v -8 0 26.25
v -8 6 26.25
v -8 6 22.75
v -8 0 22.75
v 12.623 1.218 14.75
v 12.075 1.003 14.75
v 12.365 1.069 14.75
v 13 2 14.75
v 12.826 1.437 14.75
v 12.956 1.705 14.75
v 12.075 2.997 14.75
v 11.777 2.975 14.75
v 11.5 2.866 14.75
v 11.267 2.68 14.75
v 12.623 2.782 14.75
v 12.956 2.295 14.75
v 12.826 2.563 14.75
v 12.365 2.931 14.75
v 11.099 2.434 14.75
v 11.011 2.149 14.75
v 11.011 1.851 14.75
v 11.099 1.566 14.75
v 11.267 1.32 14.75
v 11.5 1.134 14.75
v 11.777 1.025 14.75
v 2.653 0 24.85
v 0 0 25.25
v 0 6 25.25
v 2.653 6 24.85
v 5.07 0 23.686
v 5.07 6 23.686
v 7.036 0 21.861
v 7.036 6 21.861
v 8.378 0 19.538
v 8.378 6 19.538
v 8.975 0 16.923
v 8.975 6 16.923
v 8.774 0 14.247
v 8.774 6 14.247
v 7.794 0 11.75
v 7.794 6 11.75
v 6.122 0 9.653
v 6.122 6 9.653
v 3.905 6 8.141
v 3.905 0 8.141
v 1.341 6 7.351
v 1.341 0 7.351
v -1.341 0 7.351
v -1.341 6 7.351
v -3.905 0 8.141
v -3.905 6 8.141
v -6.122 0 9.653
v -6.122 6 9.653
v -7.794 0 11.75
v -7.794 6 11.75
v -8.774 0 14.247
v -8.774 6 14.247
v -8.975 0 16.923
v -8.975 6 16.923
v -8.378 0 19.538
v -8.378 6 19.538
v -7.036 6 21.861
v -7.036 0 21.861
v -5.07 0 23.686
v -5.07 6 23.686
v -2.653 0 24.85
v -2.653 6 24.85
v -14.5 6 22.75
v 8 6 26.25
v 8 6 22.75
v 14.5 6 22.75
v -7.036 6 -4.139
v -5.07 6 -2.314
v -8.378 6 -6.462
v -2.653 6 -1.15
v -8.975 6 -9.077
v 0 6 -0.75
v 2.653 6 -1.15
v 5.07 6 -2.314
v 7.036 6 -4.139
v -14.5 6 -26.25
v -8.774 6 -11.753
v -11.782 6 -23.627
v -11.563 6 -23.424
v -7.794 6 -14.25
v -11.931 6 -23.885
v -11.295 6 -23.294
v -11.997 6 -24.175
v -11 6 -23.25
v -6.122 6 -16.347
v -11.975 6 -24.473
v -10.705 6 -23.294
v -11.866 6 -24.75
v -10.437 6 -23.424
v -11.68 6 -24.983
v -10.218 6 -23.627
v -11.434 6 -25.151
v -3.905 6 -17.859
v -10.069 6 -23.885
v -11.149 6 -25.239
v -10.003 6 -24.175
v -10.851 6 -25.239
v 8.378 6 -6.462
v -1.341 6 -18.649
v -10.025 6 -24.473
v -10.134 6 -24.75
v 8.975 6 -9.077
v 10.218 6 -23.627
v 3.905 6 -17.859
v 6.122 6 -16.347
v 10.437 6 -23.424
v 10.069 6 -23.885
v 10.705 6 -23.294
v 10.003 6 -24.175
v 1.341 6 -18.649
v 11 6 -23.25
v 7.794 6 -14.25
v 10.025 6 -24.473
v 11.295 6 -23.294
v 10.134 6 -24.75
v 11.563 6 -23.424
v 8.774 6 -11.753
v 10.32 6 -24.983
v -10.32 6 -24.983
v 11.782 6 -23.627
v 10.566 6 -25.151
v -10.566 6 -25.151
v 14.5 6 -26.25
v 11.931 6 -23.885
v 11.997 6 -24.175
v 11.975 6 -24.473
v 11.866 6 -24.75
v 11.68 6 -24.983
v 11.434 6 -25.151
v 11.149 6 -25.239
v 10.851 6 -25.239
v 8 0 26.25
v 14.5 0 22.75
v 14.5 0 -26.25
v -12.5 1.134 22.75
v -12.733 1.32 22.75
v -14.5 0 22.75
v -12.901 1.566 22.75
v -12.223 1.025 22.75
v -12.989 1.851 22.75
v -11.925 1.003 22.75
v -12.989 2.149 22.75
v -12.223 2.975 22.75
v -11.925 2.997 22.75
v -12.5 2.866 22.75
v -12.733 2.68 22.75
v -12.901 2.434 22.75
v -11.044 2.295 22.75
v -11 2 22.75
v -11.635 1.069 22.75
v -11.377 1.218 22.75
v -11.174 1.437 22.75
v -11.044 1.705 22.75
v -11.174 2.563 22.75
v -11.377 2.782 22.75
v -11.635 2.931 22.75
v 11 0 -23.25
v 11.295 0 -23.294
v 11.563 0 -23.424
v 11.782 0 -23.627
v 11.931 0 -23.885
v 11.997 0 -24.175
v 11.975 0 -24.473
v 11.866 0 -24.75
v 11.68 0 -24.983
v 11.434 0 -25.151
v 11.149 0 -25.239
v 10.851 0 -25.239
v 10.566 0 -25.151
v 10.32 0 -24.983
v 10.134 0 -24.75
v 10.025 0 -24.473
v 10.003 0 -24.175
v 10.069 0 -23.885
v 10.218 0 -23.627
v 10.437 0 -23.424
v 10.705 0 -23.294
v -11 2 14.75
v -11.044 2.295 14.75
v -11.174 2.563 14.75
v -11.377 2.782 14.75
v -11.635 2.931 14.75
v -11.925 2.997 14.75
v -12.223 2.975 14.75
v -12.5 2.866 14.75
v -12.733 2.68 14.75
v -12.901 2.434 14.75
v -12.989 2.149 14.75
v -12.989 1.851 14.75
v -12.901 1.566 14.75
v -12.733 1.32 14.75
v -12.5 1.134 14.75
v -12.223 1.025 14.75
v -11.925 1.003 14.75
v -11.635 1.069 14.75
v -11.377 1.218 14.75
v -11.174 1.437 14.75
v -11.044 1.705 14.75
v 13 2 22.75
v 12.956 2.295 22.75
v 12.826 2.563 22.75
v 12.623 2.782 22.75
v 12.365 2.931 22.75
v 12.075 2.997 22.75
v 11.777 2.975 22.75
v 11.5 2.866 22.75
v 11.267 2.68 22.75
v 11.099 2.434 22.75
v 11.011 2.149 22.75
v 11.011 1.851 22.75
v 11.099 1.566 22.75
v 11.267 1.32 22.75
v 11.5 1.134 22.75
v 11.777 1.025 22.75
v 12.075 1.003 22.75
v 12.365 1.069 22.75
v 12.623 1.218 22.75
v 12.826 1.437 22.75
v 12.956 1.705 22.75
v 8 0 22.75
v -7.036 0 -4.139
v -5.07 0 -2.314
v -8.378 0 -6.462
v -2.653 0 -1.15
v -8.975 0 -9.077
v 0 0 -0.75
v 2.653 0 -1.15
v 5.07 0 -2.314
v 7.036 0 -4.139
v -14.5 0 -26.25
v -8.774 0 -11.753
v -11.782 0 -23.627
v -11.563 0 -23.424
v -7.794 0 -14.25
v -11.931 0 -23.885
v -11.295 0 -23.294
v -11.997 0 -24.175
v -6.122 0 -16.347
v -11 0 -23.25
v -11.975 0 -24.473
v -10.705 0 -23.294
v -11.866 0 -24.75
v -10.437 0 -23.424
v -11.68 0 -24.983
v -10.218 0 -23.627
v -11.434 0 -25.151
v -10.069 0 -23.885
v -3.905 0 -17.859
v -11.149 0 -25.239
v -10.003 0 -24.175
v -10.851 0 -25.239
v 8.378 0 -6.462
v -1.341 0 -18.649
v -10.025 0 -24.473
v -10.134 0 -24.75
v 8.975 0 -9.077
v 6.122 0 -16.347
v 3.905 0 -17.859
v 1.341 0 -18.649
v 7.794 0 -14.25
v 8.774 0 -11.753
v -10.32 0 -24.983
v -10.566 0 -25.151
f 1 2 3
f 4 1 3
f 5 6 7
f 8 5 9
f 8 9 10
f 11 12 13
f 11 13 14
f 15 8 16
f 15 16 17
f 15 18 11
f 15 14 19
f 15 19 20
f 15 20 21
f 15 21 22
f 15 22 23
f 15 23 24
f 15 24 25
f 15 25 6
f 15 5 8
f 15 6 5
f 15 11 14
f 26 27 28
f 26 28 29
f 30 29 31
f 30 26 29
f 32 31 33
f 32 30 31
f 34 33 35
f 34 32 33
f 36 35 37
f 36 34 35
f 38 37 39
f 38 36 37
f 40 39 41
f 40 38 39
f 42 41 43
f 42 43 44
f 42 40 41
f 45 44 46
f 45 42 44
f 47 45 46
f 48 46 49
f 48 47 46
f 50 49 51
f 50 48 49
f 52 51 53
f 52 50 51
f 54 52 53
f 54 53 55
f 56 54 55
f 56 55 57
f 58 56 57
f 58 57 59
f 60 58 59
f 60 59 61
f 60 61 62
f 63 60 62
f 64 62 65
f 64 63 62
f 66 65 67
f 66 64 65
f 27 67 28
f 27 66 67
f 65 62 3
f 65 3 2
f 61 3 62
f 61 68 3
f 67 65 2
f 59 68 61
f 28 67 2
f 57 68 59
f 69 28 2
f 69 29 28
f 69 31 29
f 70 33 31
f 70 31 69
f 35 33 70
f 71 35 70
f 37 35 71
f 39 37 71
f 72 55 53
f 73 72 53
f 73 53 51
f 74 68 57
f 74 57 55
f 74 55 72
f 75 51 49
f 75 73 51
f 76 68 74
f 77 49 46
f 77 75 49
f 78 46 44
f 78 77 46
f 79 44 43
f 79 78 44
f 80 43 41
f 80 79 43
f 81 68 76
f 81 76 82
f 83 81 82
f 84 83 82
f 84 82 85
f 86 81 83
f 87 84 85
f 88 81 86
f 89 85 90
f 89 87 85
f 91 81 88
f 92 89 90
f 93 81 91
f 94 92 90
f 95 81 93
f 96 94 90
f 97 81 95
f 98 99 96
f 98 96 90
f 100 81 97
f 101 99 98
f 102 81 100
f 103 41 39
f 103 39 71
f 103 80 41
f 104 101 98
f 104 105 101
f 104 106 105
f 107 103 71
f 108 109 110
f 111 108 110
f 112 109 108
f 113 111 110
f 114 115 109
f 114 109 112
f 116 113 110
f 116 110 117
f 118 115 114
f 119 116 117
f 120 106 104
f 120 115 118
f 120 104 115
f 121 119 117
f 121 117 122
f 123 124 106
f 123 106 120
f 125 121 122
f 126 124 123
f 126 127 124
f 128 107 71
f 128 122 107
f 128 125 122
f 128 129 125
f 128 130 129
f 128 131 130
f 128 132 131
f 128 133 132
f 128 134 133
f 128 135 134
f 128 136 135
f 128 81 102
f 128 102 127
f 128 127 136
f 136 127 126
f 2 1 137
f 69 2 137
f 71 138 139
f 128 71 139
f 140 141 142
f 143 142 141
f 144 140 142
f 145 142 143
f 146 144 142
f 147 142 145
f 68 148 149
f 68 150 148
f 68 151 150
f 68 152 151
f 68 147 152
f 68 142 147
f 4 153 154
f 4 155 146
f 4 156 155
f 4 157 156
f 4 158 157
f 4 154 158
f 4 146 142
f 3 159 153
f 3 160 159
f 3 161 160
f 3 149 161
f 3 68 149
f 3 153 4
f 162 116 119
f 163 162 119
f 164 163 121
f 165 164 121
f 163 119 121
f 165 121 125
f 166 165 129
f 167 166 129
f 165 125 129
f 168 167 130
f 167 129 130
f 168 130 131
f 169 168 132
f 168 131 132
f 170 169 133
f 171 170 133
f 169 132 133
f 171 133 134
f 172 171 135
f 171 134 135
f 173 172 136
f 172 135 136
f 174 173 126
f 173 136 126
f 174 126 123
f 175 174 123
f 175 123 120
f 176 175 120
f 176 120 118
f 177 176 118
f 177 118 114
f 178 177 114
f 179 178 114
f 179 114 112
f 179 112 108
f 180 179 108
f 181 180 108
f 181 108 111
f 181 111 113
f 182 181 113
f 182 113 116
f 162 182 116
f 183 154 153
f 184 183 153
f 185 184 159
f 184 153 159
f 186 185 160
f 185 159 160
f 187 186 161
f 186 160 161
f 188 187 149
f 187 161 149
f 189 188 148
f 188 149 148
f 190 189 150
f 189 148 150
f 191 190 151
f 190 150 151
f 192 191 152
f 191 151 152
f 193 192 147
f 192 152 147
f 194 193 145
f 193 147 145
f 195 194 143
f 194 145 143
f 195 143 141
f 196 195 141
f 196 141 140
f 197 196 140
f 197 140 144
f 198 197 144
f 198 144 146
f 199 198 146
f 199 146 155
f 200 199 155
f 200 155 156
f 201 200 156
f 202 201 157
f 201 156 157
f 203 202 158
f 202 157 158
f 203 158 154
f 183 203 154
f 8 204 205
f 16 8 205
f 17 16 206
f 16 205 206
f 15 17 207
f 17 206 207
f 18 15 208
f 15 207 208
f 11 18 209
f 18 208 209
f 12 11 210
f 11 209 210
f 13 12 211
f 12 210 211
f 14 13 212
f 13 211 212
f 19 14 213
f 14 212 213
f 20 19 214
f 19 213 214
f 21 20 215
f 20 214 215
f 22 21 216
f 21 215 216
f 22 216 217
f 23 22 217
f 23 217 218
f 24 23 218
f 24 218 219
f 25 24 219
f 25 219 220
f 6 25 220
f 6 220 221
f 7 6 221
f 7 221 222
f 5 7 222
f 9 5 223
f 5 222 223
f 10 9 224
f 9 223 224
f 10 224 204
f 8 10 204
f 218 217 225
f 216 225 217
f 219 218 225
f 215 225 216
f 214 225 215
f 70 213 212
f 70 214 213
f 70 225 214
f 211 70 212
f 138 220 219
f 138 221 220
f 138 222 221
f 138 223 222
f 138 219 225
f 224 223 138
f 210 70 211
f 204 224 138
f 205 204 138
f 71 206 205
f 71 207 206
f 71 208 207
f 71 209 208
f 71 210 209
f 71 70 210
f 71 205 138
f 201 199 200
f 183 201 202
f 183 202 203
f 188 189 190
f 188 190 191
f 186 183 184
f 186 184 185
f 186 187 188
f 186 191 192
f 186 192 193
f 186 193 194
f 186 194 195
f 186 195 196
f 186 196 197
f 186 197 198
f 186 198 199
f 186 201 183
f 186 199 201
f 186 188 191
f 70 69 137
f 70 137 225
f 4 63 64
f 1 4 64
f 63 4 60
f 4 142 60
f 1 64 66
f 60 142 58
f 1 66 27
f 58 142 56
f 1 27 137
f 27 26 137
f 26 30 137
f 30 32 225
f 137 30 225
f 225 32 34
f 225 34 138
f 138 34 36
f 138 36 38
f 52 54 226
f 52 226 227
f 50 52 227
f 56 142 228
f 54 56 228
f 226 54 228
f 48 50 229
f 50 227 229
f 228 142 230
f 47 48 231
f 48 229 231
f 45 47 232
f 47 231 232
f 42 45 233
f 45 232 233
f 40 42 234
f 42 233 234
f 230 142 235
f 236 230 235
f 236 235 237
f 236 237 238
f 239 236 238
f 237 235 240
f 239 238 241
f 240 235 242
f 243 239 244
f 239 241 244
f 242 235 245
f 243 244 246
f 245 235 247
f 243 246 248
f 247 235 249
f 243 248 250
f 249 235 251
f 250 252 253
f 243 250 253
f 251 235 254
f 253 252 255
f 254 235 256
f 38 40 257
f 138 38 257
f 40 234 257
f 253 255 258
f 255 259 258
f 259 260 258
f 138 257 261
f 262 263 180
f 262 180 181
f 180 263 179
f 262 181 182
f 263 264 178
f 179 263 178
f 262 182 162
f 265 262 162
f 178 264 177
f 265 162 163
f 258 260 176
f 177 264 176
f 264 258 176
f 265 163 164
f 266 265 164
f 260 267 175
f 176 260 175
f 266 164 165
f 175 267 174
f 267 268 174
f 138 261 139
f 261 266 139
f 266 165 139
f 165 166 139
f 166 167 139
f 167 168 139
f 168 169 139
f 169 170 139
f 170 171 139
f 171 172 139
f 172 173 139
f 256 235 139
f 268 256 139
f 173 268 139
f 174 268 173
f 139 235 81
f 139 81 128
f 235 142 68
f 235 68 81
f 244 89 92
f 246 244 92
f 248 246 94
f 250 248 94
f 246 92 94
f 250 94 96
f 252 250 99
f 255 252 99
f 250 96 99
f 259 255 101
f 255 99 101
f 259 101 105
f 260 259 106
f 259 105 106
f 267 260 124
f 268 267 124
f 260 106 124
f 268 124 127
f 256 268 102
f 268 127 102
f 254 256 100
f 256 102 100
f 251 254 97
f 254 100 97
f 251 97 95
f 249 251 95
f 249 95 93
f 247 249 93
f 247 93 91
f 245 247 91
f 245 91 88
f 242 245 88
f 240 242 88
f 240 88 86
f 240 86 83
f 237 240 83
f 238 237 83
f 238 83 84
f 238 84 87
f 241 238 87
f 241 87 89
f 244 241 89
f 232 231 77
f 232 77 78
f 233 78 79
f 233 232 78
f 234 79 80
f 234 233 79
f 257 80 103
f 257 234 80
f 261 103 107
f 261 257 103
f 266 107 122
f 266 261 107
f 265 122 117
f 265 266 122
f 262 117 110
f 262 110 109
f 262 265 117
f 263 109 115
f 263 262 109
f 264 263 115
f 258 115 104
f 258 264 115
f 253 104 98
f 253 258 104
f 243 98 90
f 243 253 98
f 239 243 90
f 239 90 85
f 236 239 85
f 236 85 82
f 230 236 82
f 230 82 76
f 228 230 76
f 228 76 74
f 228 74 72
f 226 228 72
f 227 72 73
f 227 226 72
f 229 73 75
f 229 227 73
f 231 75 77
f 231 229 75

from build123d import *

# Parameters (mm, degrees)
SKETCH_1_W          = 29
SKETCH_1_H          = 52.5
SKETCH_1_R          = 9
EXTRUDE_1_DEPTH     = 6
SKETCH_2_W          = 6.5
SKETCH_2_H          = 3.5
CUT_EXTRUDE_1_DEPTH = 10
SKETCH_3_R          = 1
CUT_EXTRUDE_4_DEPTH = 8
SKETCH_4_R          = 1
CUT_EXTRUDE_5_DEPTH = 10


with BuildPart() as part:
    # 草图1 → 凸台-拉伸1 (new body)
    with BuildSketch(Plane(origin=(0, 0, 0), x_dir=(1, 0, 0), z_dir=(0, 1, 0))):
        Rectangle(SKETCH_1_W, SKETCH_1_H)
        with Locations(Location((0, -16.25, 0), (0, 0, 270))):
            Circle(SKETCH_1_R, mode=Mode.SUBTRACT)
        with Locations(Location((0, 9.75, 0), (0, 0, 270))):
            Circle(SKETCH_1_R, mode=Mode.SUBTRACT)
    extrude(amount=EXTRUDE_1_DEPTH)

    # 草图2 → 切除-拉伸1 (cut)
    with BuildSketch(Plane(origin=(0, 6, 0), x_dir=(1, 0, 0), z_dir=(0, 1, 0))):
        with Locations((-11.25, -24.5)):
            Rectangle(SKETCH_2_W, SKETCH_2_H)
        with Locations((11.25, -24.5)):
            Rectangle(SKETCH_2_W, SKETCH_2_H)
    extrude(amount=-CUT_EXTRUDE_1_DEPTH, mode=Mode.SUBTRACT)

    # 草图3 → 切除-拉伸4 (cut)
    with BuildSketch(Plane.XY.offset(22.75)):
        with Locations((-12, 2)):
            Circle(SKETCH_3_R)
        with Locations((12, 2)):
            Circle(SKETCH_3_R)
    extrude(amount=-CUT_EXTRUDE_4_DEPTH, mode=Mode.SUBTRACT)

    # 草图4 → 切除-拉伸5 (cut)
    with BuildSketch(Plane(origin=(0, 6, 0), x_dir=(1, 0, 0), z_dir=(0, 1, 0))):
        with Locations(Location((-11, 24.25, 0), (0, 0, 270))):
            Circle(SKETCH_4_R)
        with Locations(Location((11, 24.25, 0), (0, 0, 270))):
            Circle(SKETCH_4_R)
    extrude(amount=-CUT_EXTRUDE_5_DEPTH, mode=Mode.SUBTRACT)


solid = part.part
